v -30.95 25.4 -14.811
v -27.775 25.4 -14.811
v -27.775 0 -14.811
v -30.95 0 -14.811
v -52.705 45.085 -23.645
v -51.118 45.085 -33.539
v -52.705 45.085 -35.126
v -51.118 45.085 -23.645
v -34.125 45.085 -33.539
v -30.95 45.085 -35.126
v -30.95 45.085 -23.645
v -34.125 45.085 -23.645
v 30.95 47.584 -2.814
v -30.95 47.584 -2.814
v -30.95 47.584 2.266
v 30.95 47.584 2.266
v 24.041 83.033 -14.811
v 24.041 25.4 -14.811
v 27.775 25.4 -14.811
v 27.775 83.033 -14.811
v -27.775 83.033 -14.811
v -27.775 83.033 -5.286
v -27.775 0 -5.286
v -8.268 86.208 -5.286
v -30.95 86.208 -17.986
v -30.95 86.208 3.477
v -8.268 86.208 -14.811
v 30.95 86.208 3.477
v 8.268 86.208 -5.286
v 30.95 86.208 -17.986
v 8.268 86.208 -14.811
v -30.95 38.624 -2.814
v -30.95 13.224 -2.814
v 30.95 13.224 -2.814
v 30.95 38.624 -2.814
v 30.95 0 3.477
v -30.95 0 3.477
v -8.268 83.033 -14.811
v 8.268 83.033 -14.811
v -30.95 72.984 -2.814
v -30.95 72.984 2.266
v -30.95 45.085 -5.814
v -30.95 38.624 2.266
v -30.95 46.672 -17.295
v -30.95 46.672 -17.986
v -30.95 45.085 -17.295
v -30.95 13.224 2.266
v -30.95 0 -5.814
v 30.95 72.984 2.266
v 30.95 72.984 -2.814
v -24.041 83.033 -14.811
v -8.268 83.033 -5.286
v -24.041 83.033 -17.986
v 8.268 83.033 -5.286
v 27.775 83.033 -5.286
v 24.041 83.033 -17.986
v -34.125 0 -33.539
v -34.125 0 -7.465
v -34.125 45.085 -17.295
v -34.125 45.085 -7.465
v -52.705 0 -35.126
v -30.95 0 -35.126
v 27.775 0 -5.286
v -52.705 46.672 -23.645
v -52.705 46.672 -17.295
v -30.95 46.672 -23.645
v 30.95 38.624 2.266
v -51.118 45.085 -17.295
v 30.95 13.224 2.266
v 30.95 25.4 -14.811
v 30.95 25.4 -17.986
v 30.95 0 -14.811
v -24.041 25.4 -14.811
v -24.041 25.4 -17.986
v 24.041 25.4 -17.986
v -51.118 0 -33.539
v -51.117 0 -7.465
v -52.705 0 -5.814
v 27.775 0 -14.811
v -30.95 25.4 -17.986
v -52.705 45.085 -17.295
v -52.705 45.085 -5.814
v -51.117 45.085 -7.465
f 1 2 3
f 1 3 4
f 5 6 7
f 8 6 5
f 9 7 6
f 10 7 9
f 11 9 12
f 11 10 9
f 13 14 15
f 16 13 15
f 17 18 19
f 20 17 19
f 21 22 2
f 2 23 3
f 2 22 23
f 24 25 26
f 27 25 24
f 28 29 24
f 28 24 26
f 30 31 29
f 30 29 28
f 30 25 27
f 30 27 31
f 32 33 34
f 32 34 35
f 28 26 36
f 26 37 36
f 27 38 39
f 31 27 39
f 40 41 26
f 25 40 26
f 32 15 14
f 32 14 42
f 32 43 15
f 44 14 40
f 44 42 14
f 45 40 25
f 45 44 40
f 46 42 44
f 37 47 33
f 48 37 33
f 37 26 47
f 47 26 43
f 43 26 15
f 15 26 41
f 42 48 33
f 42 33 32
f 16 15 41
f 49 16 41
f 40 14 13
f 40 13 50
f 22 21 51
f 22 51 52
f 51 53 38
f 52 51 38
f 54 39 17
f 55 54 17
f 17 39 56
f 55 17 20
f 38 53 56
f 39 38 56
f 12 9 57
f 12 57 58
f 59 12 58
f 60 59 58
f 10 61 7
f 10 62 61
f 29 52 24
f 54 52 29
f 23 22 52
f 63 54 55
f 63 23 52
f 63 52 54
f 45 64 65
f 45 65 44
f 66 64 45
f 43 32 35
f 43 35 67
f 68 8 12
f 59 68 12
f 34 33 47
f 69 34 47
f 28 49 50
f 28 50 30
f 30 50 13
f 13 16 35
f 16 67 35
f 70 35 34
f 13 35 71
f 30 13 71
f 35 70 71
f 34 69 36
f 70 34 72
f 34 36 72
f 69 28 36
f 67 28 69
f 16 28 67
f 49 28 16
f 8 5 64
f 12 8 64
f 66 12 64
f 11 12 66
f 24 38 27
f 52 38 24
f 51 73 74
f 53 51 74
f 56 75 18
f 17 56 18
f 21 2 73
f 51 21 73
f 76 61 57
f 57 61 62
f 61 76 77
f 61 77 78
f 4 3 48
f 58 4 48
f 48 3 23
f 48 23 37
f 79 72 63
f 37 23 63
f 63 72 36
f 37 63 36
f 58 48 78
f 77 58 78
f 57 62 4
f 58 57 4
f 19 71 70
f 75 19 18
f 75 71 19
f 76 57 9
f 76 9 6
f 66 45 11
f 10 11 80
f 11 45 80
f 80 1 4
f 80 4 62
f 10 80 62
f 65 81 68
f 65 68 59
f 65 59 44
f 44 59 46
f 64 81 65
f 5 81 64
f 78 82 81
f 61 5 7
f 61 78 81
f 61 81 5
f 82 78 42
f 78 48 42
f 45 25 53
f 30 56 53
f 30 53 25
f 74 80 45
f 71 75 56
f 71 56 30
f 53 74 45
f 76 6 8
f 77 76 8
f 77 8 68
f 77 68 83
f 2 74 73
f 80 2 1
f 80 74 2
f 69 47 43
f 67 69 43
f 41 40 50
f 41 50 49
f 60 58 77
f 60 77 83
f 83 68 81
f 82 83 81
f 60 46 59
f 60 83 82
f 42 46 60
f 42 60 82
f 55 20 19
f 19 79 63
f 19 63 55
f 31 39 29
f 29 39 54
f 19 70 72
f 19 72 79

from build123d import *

# Parameters (mm, degrees)
BOSS_EXTRUDE1_DEPTH  = 83.0326
SKETCH6_W            = 61.8998
SKETCH6_H            = 21.463
BOSS_EXTRUDE3_DEPTH  = 3.175
SKETCH7_W            = 16.5354
SKETCH7_H            = 9.525
CUT_EXTRUDE2_DEPTH   = 91.420129415
SKETCH8_W            = 5.08
SKETCH8_H            = 25.4
CUT_EXTRUDE3_DEPTH   = 108.64212172
SKETCH15_W           = 27.7241
SKETCH15_H           = 45.085
BOSS_EXTRUDE5_DEPTH  = 3.175
SKETCH21_W           = 1.651
SKETCH21_H           = 45.085
BOSS_EXTRUDE10_DEPTH = 16.9926
SKETCH22_W           = 20.1676
SKETCH22_H           = 45.085
BOSS_EXTRUDE11_DEPTH = 1.5875
SKETCH23_W           = 29.3116
SKETCH23_H           = 45.085
BOSS_EXTRUDE12_DEPTH = 1.5875
SKETCH24_W           = 21.7551
SKETCH24_H           = 6.35
BOSS_EXTRUDE13_DEPTH = 1.5875
SKETCH25_W           = 61.8998
SKETCH25_H           = 25.4
CUT_EXTRUDE4_DEPTH   = 3.175


with BuildPart() as part:
    # Sketch1 → Boss-Extrude1 (new body)
    with BuildSketch(Plane(origin=(0, 0, 0), x_dir=(1, 0, 0), z_dir=(0, 1, 0))):
        Polygon((-30.9499, -3.477149156), (30.9499, -3.477149156), (30.9499, 17.985850844), (24.0411, 17.985850844), (24.0411, 14.810850844), (27.7749, 14.810850844), (27.7749, 5.285850844), (-27.7749, 5.285850844), (-27.7749, 14.810850844), (-24.0411, 14.810850844), (-24.0411, 17.985850844), (-30.9499, 17.985850844), align=None)
    extrude(amount=BOSS_EXTRUDE1_DEPTH)

    # Sketch6 → Boss-Extrude3 (add)
    with BuildSketch(Plane(origin=(0, 83.0326, 0), x_dir=(1, 0, 0), z_dir=(0, 1, 0))):
        with Locations((0, 7.254350844)):
            Rectangle(SKETCH6_W, SKETCH6_H)
    extrude(amount=BOSS_EXTRUDE3_DEPTH)

    # Sketch7 → Cut-Extrude2 (cut, through all)
    with BuildSketch(Plane.XZ.offset(-83.0326)):
        with Locations((0, -10.048350844)):
            Rectangle(SKETCH7_W, SKETCH7_H)
    extrude(amount=-CUT_EXTRUDE2_DEPTH, mode=Mode.SUBTRACT)

    # Sketch8 → Cut-Extrude3 (cut, through all)
    with BuildSketch(Plane.ZY.offset(30.9499)):
        with Locations((-0.274453158, 60.28364576)):
            Rectangle(SKETCH8_W, SKETCH8_H)
        with Locations((-0.274453158, 25.92395424)):
            Rectangle(SKETCH8_W, SKETCH8_H)
    extrude(amount=-CUT_EXTRUDE3_DEPTH, mode=Mode.SUBTRACT)

    # Sketch15 → Boss-Extrude5 (add)
    with BuildSketch(Plane.ZY.offset(30.9499)):
        with Locations((-19.676493716, 22.5425)):
            Rectangle(SKETCH15_W, SKETCH15_H)
    extrude(amount=BOSS_EXTRUDE5_DEPTH)

    # Sketch21 → Boss-Extrude10 (add)
    with BuildSketch(Plane.ZY.offset(34.1249)):
        with Locations((-6.639943716, 22.5425)):
            Rectangle(SKETCH21_W, SKETCH21_H)
    extrude(amount=BOSS_EXTRUDE10_DEPTH)

    # Sketch22 → Boss-Extrude11 (add)
    with BuildSketch(Plane(origin=(0, 0, -33.538543716), x_dir=(-1, 0, 0), z_dir=(0, 0, -1))):
        with Locations((41.0337, 22.5425)):
            Rectangle(SKETCH22_W, SKETCH22_H)
    extrude(amount=BOSS_EXTRUDE11_DEPTH)

    # Sketch23 → Boss-Extrude12 (add)
    with BuildSketch(Plane.ZY.offset(51.1175)):
        with Locations((-20.470243716, 22.5425)):
            Rectangle(SKETCH23_W, SKETCH23_H)
    extrude(amount=BOSS_EXTRUDE12_DEPTH)

    # Sketch24 → Boss-Extrude13 (add)
    with BuildSketch(Plane(origin=(0, 45.085, 0), x_dir=(1, 0, 0), z_dir=(0, 1, 0))):
        with Locations((-41.82745, 20.470243716)):
            Rectangle(SKETCH24_W, SKETCH24_H)
    extrude(amount=BOSS_EXTRUDE13_DEPTH)

    # Sketch25 → Cut-Extrude4 (cut)
    with BuildSketch(Plane(origin=(0, 0, -17.985850844), x_dir=(-1, 0, 0), z_dir=(0, 0, -1))):
        with Locations((0, 12.7)):
            Rectangle(SKETCH25_W, SKETCH25_H)
    extrude(amount=-CUT_EXTRUDE4_DEPTH, mode=Mode.SUBTRACT)


solid = part.part
